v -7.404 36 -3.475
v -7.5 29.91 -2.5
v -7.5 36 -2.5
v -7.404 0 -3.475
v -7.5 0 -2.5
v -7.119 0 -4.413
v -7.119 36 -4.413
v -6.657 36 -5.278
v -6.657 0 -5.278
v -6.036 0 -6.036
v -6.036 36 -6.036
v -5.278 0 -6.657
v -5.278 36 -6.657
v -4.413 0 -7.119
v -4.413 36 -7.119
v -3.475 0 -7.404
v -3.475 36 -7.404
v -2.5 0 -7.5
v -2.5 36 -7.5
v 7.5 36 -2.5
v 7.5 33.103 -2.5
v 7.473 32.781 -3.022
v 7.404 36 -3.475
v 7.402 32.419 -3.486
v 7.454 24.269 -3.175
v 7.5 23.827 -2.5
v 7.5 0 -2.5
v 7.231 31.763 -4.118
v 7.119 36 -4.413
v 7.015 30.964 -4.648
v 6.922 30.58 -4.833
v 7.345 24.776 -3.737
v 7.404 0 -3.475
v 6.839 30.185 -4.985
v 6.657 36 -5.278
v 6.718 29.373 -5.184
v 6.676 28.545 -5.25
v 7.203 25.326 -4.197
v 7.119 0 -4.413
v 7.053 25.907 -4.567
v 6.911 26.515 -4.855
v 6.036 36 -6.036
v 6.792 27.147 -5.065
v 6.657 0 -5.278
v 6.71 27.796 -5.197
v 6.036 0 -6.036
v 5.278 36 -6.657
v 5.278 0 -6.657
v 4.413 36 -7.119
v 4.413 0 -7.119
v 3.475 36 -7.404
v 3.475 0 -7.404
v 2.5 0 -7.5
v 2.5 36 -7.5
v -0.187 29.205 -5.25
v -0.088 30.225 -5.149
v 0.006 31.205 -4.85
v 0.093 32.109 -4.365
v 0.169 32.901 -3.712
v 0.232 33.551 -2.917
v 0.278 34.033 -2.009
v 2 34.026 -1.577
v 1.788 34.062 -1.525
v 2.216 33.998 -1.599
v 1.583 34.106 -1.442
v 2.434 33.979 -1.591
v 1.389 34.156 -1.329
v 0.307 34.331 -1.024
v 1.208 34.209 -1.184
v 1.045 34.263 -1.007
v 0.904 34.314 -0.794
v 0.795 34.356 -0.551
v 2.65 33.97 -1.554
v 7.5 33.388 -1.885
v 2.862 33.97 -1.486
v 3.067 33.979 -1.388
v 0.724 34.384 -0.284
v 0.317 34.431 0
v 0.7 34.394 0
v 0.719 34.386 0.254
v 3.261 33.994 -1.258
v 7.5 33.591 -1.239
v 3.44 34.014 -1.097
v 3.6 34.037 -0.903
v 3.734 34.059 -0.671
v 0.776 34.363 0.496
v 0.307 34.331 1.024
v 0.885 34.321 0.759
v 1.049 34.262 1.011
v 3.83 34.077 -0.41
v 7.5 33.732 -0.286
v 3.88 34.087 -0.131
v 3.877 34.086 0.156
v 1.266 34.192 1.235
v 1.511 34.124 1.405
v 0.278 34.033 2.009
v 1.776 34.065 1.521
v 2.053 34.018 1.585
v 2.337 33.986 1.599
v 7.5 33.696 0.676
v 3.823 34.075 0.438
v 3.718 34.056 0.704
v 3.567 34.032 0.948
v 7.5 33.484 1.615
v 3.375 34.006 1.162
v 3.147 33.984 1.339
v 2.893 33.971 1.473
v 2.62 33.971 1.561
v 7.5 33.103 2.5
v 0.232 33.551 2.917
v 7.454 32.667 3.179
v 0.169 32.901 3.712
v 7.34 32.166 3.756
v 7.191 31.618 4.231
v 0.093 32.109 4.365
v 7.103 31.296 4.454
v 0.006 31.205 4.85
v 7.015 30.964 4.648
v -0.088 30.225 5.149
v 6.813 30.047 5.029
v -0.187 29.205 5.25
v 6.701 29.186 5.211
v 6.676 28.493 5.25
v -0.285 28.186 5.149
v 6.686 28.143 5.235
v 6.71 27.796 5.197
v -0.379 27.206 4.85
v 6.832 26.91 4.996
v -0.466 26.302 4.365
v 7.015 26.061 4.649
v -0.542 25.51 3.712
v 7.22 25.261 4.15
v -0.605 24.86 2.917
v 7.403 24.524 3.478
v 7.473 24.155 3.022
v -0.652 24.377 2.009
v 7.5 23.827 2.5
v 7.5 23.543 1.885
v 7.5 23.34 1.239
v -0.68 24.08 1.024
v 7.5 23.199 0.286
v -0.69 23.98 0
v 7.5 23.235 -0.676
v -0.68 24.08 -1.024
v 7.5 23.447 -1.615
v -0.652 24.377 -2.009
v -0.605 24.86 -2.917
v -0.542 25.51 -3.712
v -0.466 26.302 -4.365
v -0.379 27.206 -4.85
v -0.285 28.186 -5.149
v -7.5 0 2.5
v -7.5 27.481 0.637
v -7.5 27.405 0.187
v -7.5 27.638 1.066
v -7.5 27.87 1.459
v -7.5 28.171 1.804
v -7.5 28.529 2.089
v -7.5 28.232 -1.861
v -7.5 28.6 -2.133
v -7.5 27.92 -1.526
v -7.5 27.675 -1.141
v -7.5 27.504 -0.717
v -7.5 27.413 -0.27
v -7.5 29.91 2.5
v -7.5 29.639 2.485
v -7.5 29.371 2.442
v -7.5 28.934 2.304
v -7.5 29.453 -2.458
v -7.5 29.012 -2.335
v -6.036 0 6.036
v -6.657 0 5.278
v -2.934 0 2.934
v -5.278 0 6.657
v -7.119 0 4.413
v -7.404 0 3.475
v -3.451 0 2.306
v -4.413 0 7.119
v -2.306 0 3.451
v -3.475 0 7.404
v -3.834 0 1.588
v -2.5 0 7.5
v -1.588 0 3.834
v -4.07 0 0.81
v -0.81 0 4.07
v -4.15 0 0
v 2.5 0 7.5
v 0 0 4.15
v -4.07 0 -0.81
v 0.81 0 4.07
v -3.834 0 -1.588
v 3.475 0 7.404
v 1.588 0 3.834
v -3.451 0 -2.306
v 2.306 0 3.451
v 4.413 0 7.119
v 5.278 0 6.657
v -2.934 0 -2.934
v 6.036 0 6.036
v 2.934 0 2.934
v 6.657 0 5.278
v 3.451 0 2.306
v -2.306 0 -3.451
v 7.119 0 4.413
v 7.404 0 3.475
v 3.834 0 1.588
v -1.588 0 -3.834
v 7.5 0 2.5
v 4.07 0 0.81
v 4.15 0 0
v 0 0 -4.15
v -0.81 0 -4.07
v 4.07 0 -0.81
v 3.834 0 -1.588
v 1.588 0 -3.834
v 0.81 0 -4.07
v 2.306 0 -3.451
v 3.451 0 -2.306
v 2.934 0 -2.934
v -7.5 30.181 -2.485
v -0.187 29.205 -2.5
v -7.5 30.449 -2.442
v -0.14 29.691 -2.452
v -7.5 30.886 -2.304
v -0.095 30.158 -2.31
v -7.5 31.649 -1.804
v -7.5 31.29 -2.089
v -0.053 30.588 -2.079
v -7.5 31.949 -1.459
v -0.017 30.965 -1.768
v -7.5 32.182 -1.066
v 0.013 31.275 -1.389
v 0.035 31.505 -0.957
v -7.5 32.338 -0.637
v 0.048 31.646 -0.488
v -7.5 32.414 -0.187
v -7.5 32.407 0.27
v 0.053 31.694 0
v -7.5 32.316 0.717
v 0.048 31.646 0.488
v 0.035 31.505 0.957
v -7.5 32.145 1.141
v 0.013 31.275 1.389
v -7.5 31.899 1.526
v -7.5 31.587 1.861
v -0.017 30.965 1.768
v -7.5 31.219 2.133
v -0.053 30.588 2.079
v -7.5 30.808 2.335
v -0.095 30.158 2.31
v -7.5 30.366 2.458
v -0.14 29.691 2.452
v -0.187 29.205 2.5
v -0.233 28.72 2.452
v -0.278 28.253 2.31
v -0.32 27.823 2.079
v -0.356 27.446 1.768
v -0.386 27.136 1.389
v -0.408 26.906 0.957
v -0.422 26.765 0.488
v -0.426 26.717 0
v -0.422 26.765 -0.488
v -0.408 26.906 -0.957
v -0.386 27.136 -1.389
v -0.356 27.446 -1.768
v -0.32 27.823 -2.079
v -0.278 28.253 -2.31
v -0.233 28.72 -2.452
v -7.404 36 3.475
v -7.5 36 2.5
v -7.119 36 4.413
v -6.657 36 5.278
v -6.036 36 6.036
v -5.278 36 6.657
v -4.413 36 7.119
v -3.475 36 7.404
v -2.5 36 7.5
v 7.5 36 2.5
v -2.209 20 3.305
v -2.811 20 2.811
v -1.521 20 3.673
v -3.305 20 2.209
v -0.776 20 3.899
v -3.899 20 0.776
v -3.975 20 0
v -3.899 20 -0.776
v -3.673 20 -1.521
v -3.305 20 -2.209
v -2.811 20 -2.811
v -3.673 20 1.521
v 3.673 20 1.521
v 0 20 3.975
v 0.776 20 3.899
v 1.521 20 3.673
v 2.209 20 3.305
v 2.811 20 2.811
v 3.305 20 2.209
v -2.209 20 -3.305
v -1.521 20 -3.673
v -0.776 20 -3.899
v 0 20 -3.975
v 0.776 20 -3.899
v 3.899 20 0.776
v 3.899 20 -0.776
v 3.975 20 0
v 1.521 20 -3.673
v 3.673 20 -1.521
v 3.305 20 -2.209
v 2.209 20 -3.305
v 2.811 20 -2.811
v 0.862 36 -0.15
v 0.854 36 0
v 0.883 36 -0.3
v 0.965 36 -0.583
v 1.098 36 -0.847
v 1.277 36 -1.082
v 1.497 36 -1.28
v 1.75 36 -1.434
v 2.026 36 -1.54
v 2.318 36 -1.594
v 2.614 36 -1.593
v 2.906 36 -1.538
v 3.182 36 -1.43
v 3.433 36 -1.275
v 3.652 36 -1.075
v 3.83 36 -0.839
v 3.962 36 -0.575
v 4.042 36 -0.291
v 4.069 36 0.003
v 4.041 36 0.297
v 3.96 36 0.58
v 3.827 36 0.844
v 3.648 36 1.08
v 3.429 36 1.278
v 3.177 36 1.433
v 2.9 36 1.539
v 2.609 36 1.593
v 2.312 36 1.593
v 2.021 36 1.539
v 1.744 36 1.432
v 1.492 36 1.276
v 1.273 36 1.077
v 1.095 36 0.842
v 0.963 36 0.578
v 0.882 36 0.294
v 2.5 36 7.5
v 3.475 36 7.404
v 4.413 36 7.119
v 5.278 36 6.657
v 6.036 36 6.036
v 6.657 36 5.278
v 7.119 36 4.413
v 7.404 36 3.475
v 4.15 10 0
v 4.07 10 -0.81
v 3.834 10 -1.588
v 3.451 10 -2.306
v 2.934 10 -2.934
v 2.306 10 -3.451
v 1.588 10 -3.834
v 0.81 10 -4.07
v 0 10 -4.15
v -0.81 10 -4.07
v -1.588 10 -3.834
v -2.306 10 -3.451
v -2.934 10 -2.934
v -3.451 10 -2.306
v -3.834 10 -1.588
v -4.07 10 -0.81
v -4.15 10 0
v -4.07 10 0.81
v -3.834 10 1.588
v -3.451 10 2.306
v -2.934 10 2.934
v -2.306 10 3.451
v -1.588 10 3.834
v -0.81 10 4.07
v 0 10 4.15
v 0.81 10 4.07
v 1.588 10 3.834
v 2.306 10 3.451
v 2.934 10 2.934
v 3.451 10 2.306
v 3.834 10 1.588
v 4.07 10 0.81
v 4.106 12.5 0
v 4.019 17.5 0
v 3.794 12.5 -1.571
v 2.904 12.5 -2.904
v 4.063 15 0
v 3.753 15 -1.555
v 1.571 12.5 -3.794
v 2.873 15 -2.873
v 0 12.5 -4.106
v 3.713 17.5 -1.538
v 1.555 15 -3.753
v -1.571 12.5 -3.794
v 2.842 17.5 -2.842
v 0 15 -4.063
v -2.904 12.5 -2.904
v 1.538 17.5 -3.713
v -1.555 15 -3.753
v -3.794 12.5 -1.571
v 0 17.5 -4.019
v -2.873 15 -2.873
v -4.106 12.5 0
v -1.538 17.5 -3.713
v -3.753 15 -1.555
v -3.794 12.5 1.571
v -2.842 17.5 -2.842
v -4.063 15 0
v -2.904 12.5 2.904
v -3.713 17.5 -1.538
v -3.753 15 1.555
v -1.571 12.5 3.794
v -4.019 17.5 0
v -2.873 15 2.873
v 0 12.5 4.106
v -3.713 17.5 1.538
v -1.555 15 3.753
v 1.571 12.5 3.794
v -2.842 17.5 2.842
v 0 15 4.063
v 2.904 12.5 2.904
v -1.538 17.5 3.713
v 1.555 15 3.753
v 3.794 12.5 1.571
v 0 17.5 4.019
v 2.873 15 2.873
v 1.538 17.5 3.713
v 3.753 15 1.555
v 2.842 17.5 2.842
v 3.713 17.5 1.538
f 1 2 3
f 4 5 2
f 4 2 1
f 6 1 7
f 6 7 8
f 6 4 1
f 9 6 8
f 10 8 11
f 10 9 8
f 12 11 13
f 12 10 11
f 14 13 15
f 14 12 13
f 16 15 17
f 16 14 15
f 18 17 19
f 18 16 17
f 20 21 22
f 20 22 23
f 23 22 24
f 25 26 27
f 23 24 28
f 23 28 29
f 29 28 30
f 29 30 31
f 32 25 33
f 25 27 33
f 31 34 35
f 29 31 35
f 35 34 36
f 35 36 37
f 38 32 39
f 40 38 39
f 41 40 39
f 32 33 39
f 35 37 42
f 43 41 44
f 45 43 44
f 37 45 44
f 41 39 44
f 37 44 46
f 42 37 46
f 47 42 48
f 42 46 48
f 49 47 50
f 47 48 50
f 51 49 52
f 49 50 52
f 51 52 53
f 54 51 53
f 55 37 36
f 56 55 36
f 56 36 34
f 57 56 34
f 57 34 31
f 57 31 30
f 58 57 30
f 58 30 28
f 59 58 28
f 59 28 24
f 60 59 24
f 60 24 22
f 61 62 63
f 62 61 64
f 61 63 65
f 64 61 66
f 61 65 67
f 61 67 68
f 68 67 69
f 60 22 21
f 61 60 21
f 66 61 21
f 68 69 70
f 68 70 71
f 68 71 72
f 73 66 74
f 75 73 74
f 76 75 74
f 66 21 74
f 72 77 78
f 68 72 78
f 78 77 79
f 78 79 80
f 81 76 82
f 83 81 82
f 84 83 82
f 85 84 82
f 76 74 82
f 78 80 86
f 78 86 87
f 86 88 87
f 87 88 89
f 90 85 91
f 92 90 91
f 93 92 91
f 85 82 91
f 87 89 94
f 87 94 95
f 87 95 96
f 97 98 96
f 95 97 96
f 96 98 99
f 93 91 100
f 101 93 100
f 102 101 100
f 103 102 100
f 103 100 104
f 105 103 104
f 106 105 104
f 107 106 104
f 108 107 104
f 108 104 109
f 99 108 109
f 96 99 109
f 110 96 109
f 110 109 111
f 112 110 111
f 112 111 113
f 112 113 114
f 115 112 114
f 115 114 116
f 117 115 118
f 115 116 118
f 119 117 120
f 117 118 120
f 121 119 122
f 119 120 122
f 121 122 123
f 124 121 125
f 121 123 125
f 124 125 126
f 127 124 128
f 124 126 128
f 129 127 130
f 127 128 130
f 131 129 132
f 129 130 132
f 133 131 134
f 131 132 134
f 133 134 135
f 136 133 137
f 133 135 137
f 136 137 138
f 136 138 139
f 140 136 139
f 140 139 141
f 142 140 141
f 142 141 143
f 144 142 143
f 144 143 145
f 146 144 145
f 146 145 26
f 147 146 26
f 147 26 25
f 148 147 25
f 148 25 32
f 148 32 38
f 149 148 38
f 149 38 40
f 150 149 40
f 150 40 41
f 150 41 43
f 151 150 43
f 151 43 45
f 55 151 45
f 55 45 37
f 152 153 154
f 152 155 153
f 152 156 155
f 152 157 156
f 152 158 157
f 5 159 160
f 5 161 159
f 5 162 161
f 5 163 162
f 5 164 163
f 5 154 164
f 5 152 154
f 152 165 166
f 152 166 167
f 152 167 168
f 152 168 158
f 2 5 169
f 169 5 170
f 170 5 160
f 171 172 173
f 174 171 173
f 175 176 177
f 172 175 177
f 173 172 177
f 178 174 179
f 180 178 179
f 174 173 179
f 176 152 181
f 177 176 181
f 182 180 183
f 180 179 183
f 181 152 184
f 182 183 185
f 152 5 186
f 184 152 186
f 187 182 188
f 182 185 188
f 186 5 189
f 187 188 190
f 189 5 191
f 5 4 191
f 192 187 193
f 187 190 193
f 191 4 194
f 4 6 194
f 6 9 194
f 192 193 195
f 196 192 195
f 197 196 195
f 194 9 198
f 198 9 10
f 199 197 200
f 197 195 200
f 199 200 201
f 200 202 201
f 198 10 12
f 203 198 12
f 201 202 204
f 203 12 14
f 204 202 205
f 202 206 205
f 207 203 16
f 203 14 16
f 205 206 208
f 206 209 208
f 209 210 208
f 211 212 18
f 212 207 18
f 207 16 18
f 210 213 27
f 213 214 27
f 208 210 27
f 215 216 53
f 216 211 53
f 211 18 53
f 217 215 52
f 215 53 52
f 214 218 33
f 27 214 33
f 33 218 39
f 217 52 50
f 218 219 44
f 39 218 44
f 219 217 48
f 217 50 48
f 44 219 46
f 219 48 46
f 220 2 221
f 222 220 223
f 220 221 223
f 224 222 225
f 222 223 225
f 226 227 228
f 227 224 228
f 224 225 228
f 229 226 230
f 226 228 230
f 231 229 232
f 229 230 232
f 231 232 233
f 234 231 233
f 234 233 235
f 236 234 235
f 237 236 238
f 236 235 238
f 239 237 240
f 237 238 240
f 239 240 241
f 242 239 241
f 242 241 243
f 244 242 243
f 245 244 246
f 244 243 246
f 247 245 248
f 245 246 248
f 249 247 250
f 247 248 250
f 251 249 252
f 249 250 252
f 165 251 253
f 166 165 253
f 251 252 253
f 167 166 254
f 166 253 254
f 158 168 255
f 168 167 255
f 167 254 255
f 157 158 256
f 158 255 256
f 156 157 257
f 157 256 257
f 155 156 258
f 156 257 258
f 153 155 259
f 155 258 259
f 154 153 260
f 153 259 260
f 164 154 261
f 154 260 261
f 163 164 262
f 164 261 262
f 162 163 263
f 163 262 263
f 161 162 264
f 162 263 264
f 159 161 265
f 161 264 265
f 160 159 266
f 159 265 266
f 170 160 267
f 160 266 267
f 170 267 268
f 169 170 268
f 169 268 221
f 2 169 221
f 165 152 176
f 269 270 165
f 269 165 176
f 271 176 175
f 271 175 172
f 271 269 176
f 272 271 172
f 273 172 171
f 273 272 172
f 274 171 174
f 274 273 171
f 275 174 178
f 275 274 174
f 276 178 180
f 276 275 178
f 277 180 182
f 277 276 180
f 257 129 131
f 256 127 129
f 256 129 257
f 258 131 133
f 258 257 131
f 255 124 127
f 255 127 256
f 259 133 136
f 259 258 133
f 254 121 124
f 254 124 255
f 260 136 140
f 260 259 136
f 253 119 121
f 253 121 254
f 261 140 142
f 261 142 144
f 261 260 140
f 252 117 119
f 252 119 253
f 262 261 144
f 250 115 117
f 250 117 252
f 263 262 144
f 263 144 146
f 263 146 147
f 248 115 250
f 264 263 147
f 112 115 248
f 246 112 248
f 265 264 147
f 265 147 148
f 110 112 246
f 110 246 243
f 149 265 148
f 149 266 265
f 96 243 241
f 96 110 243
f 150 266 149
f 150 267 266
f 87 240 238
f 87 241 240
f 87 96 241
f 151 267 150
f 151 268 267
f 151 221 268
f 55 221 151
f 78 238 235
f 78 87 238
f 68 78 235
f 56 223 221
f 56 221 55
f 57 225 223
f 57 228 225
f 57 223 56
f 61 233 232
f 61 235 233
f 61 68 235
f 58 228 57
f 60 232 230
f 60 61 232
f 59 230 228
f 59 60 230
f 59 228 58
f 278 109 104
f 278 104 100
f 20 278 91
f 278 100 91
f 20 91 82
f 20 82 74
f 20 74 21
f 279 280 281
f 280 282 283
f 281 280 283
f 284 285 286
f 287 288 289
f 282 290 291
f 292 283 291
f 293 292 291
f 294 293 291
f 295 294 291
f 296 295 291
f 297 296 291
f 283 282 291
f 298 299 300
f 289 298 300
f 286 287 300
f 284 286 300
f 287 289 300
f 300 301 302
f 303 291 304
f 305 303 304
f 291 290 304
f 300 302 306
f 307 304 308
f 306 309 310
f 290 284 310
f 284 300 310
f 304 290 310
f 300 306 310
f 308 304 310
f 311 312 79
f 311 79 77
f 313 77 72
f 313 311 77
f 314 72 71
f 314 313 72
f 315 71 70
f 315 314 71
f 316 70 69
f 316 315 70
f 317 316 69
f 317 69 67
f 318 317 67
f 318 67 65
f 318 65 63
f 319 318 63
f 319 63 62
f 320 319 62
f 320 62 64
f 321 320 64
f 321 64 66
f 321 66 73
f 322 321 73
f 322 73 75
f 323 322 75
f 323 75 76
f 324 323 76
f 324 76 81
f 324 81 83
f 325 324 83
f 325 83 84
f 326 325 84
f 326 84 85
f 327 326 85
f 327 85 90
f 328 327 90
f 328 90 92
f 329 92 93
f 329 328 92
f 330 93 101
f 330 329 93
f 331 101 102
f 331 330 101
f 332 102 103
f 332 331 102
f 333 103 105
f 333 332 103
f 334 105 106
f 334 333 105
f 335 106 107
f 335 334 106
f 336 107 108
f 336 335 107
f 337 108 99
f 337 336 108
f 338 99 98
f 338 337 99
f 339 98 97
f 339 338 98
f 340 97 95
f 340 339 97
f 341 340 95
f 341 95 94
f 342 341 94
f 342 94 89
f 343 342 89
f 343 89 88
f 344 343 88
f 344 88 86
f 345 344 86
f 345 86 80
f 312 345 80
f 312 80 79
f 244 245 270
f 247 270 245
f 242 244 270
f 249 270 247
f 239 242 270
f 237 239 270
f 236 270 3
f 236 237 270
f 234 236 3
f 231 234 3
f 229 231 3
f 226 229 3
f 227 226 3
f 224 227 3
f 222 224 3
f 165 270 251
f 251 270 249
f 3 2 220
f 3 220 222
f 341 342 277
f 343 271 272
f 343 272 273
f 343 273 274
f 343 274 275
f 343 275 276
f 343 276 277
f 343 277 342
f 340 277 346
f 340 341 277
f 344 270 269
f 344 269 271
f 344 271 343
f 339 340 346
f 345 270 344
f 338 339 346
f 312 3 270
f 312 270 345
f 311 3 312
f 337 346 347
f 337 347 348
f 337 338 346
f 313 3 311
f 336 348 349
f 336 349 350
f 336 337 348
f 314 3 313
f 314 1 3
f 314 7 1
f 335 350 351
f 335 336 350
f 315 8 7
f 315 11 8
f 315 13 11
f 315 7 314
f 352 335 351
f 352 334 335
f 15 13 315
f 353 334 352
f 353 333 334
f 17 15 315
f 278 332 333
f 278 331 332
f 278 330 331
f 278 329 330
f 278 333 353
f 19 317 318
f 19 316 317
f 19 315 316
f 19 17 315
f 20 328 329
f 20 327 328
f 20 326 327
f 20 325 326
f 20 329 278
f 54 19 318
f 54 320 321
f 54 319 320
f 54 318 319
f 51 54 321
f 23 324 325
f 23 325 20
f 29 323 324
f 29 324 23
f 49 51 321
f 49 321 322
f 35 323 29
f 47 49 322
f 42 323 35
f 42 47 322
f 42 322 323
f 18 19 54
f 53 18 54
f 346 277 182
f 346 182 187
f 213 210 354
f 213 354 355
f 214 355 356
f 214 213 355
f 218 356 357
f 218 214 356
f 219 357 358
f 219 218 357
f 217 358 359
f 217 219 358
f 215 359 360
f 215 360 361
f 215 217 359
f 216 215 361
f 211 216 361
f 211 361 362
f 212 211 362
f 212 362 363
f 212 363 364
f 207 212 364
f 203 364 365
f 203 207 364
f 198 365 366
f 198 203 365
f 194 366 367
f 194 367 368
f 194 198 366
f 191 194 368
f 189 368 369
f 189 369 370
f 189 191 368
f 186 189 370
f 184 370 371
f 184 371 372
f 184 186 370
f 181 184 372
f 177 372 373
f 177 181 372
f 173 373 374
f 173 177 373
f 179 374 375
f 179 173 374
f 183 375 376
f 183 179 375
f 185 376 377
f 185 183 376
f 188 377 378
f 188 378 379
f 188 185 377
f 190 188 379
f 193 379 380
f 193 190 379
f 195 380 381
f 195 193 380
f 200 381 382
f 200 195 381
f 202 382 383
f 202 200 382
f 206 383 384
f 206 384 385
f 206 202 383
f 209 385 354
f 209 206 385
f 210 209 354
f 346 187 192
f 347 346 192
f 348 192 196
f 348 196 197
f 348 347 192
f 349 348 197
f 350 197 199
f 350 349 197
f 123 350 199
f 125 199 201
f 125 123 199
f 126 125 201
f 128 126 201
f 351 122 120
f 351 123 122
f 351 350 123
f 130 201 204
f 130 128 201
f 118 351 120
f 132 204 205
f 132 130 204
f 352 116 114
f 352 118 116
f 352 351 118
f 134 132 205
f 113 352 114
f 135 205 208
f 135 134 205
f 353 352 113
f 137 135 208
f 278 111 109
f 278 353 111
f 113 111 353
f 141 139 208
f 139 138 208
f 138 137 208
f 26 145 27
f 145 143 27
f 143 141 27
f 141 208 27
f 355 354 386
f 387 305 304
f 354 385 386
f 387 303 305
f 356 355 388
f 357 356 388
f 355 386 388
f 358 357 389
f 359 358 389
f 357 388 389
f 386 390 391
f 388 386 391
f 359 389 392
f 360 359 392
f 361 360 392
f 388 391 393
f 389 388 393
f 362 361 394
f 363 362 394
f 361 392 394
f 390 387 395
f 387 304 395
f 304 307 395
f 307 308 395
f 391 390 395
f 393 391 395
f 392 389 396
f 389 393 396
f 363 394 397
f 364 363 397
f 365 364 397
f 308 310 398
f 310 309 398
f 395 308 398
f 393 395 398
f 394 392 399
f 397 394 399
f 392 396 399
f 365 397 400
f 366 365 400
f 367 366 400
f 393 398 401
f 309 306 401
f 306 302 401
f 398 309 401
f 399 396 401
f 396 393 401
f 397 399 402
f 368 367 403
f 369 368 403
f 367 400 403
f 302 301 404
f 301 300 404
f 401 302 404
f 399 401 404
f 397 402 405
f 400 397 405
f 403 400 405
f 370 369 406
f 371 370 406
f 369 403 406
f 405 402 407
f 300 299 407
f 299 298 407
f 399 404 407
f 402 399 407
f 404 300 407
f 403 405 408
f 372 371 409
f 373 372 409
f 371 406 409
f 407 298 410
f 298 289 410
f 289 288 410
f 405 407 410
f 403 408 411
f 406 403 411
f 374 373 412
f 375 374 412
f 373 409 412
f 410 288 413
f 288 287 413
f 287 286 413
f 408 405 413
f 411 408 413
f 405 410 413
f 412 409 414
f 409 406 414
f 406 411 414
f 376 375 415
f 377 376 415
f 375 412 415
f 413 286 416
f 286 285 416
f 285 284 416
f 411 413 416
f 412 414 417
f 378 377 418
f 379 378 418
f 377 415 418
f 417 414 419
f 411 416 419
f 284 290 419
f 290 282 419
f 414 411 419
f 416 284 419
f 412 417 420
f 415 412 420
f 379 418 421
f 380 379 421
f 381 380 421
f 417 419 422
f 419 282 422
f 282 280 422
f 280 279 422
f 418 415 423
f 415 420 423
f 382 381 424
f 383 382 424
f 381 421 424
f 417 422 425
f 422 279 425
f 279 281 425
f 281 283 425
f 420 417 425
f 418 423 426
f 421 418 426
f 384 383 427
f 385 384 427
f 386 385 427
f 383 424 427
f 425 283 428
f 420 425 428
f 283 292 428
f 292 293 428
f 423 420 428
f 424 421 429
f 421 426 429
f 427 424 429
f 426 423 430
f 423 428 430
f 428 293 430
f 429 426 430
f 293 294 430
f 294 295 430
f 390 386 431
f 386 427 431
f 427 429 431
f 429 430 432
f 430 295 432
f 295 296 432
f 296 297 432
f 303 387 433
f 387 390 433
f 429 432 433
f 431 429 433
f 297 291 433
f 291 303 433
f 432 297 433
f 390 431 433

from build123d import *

# Parameters (mm, degrees)
SKETCH1_W                      = 15
SKETCH1_H                      = 15
SKETCH1_R                      = 4.15
BOSS_EXTRUDE1_DEPTH            = 20
SKETCH2_W                      = 15
SKETCH2_H                      = 15
BOSS_EXTRUDE2_DEPTH            = 16
FILLET1_R                      = 5
CUT_EXTRUDE1_DEPTH             = 39.422077783
CUT_EXTRUDE1_DEPTH_BACK        = 39.422077783
SKETCH3_R                      = 2.5
CUT_EXTRUDE2_DEPTH             = 39.422077783
CUT_EXTRUDE2_DEPTH_BACK        = 7
SKETCH4_R                      = 5.25
CUT_EXTRUDE3_REACH             = 44.637
SKETCH5_R                      = 1.6
CUT_EXTRUDE3_DIRECTION_2_DEPTH = 10
CHAMFER1_SIZE                  = 10
CHAMFER1_SIZE2                 = 0.174550649


with BuildPart() as part:
    # Sketch1 → Boss-Extrude1 (new body)
    with BuildSketch(Plane(origin=(0, 0, 0), x_dir=(1, 0, 0), z_dir=(0, 1, 0))):
        Rectangle(SKETCH1_W, SKETCH1_H)
        Circle(SKETCH1_R, mode=Mode.SUBTRACT)
    extrude(amount=BOSS_EXTRUDE1_DEPTH)

    # Sketch2 → Boss-Extrude2 (add)
    with BuildSketch(Plane(origin=(0, 20, 0), x_dir=(1, 0, 0), z_dir=(0, 1, 0))):
        Rectangle(SKETCH2_W, SKETCH2_H)
    extrude(amount=BOSS_EXTRUDE2_DEPTH)

    # Fillet1
    fillet1_edges = [part.edges().sort_by_distance(p)[0] for p in [
        (-7.5, 18, -7.5),
        (7.5, 18, -7.5),
        (-7.5, 18, 7.5),
        (7.5, 18, 7.5),
    ]]
    fillet(fillet1_edges, radius=FILLET1_R)

    # Sketch3 → Cut-Extrude1 (cut, two sides: drawn at the far end of the back side and taken through both)
    with BuildSketch(Plane(origin=(4.046061336, 0.129475488, 0), x_dir=(0, 0, -1), z_dir=(0.9953961983671789, -0.09584575252022422, 0)).offset(-CUT_EXTRUDE1_DEPTH_BACK)):
        with Locations((0, 28.536429083)):
            Circle(SKETCH3_R)
    extrude(amount=CUT_EXTRUDE1_DEPTH + CUT_EXTRUDE1_DEPTH_BACK, mode=Mode.SUBTRACT)

    # Sketch4 → Cut-Extrude2 (cut, two sides: drawn at the far end of the back side and taken through both)
    with BuildSketch(Plane(origin=(4.046061336, 0.129475488, 0), x_dir=(0, 0, -1), z_dir=(0.9953961983671789, -0.09584575252022422, 0)).offset(-CUT_EXTRUDE2_DEPTH_BACK)):
        with Locations((0, 28.536429083)):
            Circle(SKETCH4_R)
    extrude(amount=CUT_EXTRUDE2_DEPTH + CUT_EXTRUDE2_DEPTH_BACK, mode=Mode.SUBTRACT)

    # Sketch5 → Cut-Extrude3 (cut, up to next)
    with BuildSketch(Plane(origin=(15.282832762, 35.250598441, 0), x_dir=(-0.9953961983671784, 0.09584575252022766, 0), z_dir=(-0.09584575252022767, -0.9953961983671784, 0)), mode=Mode.PRIVATE) as cut_extrude3_sk1:
        with Locations((12.833853497, 0)):
            Circle(SKETCH5_R)
    cut_extrude3_tool1 = extrude(cut_extrude3_sk1.sketch, amount=CUT_EXTRUDE3_REACH, mode=Mode.PRIVATE) & part.part
    add(cut_extrude3_tool1.solids().sort_by_distance((2.508064, 36.480669, 0))[0], mode=Mode.SUBTRACT)

    # Sketch5 → Cut-Extrude3 direction 2 (cut)
    with BuildSketch(Plane(origin=(15.282832762, 35.250598441, 0), x_dir=(-0.9953961983671784, 0.09584575252022766, 0), z_dir=(-0.09584575252022767, -0.9953961983671784, 0))):
        with Locations((12.833853497, 0)):
            Circle(SKETCH5_R)
    extrude(amount=-CUT_EXTRUDE3_DIRECTION_2_DEPTH, mode=Mode.SUBTRACT)

    # Chamfer1
    chamfer1_edges = [part.edges().sort_by_distance(p)[0] for p in [
        (-4.15, 20, 0),
    ]]
    chamfer1_side = [part.faces().sort_by_distance(p)[0] for p in [
        (-4.15, 10, 0),
    ]]
    chamfer(chamfer1_edges, length=CHAMFER1_SIZE, length2=CHAMFER1_SIZE2, reference=chamfer1_side[0])


solid = part.part
